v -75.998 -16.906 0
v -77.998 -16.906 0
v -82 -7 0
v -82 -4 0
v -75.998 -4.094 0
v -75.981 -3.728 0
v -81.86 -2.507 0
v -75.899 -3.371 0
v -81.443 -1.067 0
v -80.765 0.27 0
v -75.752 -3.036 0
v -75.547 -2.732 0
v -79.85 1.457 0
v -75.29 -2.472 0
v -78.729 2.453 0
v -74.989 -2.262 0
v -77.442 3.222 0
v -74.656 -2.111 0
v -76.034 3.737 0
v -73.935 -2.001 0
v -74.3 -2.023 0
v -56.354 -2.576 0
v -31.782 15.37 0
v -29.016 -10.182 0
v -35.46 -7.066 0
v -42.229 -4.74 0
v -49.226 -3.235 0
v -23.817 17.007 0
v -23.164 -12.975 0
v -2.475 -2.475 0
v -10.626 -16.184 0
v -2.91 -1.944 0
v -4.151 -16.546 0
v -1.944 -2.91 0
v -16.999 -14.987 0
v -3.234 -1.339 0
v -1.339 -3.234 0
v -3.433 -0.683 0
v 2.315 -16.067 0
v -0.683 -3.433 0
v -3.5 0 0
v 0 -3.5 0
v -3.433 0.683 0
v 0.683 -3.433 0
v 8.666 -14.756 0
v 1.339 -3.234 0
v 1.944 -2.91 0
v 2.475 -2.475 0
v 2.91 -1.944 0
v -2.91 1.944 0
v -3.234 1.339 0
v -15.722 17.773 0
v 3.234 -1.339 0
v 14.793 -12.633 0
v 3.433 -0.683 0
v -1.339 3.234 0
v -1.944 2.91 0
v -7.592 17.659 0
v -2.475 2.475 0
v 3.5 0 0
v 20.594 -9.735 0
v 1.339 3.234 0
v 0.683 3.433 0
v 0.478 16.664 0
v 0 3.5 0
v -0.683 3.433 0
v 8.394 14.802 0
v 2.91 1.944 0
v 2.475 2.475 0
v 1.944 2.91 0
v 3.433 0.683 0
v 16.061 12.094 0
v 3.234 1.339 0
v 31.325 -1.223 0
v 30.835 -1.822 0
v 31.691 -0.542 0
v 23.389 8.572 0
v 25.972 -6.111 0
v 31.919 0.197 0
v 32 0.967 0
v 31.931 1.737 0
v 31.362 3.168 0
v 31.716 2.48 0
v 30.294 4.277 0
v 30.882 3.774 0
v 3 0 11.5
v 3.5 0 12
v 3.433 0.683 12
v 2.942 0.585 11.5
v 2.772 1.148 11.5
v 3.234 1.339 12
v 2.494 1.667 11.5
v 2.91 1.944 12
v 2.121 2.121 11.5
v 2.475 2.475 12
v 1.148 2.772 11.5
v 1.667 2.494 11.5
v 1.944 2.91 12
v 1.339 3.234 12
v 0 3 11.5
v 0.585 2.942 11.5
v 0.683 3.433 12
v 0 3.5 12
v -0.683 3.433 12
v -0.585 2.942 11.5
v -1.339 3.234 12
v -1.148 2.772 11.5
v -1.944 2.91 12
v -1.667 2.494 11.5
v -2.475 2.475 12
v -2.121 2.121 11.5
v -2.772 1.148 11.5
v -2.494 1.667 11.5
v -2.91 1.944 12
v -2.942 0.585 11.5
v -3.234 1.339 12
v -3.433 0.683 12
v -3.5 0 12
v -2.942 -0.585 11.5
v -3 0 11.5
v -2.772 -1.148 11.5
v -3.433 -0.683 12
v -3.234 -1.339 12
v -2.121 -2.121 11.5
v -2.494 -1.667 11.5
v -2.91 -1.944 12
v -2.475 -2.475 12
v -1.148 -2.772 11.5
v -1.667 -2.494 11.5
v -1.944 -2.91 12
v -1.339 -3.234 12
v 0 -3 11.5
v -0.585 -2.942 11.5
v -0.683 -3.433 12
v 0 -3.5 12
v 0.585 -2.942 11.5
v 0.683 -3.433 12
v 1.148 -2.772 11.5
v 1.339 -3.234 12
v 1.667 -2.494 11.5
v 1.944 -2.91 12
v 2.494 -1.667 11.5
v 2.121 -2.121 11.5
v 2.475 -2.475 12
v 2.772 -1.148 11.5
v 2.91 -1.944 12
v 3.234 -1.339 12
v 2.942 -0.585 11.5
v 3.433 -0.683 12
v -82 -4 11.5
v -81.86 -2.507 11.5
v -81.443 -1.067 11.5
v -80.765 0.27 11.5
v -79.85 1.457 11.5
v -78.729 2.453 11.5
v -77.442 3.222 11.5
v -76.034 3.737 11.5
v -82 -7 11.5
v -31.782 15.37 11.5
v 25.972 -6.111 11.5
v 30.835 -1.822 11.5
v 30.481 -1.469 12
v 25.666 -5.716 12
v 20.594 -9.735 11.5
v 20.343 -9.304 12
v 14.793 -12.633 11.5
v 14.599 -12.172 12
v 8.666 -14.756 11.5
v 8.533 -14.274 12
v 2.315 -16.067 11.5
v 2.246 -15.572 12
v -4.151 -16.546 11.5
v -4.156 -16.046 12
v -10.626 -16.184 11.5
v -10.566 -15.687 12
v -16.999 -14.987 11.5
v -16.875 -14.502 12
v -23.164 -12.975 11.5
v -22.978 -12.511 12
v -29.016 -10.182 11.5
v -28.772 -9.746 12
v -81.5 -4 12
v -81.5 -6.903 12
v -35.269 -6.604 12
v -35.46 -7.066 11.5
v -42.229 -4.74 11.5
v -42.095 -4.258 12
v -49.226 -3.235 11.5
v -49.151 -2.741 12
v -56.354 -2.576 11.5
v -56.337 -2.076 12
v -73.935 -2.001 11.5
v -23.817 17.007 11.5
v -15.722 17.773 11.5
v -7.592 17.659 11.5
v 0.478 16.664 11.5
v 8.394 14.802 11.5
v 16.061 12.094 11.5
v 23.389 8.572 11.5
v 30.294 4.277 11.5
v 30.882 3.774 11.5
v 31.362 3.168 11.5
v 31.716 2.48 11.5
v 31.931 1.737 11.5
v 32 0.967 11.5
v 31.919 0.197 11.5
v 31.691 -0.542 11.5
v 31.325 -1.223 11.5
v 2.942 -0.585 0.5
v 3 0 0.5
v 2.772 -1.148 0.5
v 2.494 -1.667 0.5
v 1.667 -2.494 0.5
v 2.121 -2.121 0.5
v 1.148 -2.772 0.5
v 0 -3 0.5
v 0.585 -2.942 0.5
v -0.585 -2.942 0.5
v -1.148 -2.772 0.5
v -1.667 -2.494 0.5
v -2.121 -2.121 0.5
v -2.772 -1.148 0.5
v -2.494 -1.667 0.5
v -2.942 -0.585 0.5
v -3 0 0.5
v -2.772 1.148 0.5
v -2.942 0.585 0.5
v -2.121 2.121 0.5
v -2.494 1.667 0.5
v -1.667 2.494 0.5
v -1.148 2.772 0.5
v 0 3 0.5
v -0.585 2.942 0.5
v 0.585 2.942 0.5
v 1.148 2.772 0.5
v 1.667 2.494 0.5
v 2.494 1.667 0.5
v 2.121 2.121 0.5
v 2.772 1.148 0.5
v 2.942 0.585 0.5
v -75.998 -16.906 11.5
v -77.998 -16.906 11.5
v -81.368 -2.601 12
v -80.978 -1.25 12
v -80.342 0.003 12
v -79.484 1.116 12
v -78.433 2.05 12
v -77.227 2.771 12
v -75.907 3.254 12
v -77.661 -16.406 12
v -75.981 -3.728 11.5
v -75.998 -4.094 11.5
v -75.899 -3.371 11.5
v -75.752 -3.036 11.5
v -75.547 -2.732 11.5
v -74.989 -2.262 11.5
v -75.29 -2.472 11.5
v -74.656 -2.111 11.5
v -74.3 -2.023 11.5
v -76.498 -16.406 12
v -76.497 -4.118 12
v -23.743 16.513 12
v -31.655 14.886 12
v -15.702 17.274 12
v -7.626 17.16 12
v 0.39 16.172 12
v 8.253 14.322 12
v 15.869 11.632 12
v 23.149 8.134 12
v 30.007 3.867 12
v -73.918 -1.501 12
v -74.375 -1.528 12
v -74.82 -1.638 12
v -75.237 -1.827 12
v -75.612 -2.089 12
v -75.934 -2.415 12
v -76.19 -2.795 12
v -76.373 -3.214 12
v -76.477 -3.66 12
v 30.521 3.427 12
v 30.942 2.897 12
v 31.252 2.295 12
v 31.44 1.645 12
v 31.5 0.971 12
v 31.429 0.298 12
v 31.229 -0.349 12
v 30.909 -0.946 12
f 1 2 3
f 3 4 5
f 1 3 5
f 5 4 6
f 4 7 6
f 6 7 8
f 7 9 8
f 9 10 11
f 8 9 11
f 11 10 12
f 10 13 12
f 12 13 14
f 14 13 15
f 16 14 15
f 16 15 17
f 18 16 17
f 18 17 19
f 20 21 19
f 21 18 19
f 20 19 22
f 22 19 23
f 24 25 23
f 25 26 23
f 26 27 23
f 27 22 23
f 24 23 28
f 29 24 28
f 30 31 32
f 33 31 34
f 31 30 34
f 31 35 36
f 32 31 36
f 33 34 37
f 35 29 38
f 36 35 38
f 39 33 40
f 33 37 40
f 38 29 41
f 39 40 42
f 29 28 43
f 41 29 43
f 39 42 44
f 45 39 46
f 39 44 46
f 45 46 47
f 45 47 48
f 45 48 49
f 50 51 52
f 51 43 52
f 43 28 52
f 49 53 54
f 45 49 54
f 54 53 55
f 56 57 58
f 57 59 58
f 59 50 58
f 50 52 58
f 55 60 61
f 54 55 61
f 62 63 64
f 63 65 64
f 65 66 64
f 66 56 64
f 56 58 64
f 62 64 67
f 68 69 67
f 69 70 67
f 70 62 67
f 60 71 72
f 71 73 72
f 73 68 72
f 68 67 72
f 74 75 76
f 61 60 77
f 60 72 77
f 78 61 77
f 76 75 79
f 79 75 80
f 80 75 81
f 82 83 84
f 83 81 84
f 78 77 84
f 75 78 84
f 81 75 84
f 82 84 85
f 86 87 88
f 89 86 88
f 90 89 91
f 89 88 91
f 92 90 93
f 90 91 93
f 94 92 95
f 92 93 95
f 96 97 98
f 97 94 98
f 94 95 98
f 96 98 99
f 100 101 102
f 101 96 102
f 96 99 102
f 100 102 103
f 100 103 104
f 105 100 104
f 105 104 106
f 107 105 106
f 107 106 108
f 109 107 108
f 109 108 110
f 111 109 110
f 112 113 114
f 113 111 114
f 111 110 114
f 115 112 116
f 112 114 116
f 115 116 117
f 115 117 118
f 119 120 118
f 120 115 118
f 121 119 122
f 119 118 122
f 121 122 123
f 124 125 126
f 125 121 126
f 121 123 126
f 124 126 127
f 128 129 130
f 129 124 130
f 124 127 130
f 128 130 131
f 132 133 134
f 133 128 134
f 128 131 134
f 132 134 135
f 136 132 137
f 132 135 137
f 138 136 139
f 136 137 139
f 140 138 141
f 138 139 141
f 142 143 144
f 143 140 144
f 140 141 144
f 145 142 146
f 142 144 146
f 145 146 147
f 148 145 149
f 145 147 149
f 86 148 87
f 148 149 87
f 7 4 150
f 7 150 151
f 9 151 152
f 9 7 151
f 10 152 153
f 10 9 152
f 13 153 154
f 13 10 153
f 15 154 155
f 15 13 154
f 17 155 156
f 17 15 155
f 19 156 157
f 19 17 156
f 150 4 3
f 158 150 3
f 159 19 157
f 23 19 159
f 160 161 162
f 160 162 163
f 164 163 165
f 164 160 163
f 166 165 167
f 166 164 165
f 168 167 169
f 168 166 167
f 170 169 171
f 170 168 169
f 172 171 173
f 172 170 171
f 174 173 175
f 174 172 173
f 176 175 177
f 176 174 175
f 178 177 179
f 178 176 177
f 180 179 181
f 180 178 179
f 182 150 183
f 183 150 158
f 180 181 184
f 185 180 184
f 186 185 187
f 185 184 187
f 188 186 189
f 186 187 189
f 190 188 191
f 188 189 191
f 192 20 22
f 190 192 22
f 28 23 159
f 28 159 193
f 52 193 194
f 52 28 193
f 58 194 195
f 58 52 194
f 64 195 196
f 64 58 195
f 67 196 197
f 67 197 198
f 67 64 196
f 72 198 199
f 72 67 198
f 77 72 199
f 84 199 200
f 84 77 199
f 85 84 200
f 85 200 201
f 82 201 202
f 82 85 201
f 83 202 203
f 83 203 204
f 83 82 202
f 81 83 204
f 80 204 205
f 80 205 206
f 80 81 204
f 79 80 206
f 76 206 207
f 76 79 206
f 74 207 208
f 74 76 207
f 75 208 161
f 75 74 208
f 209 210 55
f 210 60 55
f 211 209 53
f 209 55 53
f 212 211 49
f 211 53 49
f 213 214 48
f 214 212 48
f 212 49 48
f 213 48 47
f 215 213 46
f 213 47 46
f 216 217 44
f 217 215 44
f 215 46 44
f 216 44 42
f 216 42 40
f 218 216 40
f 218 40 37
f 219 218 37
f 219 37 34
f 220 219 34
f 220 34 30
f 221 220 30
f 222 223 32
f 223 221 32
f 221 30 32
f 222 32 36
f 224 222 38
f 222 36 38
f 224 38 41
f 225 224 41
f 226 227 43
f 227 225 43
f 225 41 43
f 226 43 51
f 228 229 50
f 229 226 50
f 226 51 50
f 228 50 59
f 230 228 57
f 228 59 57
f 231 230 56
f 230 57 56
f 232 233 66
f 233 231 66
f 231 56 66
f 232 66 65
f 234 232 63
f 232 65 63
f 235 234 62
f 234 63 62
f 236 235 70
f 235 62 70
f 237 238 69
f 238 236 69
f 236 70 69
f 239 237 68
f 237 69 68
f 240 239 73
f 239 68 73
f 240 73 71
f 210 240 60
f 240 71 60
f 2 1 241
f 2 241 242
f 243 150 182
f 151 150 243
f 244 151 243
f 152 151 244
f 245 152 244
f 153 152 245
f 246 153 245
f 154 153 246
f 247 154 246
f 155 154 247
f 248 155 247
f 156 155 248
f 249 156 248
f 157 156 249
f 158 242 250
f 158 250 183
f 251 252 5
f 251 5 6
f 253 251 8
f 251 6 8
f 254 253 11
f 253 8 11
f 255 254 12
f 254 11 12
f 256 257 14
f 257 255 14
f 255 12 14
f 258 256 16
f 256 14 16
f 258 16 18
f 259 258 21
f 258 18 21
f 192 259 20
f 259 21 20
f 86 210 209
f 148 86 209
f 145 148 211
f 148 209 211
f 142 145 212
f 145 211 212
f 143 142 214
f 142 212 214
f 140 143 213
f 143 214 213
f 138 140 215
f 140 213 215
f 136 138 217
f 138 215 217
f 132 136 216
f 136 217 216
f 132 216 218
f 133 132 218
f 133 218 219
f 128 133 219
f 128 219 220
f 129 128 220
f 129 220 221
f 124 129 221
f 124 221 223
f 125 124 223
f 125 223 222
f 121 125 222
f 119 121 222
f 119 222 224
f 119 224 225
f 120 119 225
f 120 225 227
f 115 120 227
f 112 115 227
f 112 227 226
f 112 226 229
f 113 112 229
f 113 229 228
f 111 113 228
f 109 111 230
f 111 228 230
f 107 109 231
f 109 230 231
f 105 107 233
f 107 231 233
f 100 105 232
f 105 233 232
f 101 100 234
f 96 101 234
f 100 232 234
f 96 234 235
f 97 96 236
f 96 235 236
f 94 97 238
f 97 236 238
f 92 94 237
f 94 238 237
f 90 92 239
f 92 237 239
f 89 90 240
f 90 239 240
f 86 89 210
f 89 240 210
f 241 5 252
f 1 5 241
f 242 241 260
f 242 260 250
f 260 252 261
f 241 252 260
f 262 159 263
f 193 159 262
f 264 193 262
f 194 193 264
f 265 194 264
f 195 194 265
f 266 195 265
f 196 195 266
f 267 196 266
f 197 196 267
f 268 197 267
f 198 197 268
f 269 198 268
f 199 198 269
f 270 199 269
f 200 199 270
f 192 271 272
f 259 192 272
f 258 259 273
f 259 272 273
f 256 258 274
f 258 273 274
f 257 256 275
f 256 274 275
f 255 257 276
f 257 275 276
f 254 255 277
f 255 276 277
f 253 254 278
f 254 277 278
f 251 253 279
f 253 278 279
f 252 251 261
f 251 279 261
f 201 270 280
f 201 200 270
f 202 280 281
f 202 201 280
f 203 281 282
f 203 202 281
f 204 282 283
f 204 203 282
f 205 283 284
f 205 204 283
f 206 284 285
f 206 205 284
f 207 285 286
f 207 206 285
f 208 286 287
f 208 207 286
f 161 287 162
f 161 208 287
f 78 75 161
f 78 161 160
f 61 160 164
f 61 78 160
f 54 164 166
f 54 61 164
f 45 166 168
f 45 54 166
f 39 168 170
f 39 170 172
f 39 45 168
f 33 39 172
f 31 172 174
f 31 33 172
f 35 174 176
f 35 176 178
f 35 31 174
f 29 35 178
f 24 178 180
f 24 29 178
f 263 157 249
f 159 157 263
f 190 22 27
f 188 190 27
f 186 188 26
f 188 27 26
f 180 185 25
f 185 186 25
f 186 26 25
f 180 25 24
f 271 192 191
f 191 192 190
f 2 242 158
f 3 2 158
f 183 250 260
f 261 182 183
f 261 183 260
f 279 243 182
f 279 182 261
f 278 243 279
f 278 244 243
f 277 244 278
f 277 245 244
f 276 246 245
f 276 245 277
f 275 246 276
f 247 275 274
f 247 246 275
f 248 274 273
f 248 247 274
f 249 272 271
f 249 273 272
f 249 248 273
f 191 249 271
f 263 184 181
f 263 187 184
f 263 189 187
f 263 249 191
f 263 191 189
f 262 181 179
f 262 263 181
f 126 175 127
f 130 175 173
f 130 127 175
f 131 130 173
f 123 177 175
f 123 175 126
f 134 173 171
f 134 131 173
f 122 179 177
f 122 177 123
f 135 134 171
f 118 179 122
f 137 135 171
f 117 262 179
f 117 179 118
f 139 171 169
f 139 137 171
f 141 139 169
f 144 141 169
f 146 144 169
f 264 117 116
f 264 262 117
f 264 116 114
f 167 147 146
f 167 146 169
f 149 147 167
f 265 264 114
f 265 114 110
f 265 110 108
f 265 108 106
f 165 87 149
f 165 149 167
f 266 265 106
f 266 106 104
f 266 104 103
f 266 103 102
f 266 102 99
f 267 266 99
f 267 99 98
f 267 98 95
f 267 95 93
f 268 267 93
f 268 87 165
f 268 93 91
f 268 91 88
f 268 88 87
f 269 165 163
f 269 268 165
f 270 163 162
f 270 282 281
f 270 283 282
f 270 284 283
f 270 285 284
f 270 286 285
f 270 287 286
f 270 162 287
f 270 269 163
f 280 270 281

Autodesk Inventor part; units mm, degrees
ref_plane "YZ Plane" through (0, 0, 0) normal (1, 0, 0) x (0, 1, 0)
ref_plane "XZ Plane" through (0, 0, 0) normal (0, 1, 0) x (-1, 0, 0)
ref_plane "XY Plane" through (0, 0, 0) normal (0, 0, 1) x (1, 0, 0)
sketch "Náčrt1" plane through (0, 0, 0) normal (0, 0, 1) x (1, 0, 0)
  line L0 (-106.433, 0) -> (55.3696, 0) projected
  line L1 (0, -81.7425) -> (0, 52.651) projected
  circle A0 centre (0, 0) radius 3
  arc A1 (30.8349, -1.8219) -> (30.2938, 4.277) centre (28, 1) ccw
  arc A2 (-76.0338, 3.7372) -> (-82, -4) centre (-74, -4) ccw
  arc A3 (-73.9347, -2.0011) -> (-75.9978, -4.0942) centre (-74, -4) ccw
  line L2 (-75.9978, -3.9058) -> (-75.9978, -16.9058)
  line L3 (-75.9978, -16.9058) -> (-77.9978, -16.9058)
  line L4 (-77.9978, -16.9058) -> (-82, -7)
  line L5 (-82, -4) -> (-82, -7)
  arc A4 (30.2938, 4.277) -> (-31.7818, 15.3695) centre (-12.7146, -57.1663) ccw
  arc A5 (-29.0159, -10.1823) -> (30.8349, -1.8219) centre (-4.6017, 33.4519) ccw
  arc A6 (-29.0159, -10.1823) -> (-56.3536, -2.5755) centre (-58.3128, -62.5435) ccw
  line L6 (-76.0338, 3.7372) -> (-31.7818, 15.3695)
  line L7 (-73.9347, -2.0011) -> (-56.3536, -2.5755)
  dimension "d0" = 6
  dimension "d1" = 8
  dimension "d2" = 28
  dimension "d3" = 1
  dimension "d4" = 16
  dimension "d5" = 4
  dimension "d6" = 4
  dimension "d7" = 74
  dimension "d8" = 13
  dimension "d9" = 158
  dimension "d10" = 2
  dimension "d11" = 3
  dimension "d12" = 75
  dimension "d13" = 50
  dimension "d14" = 60
extrude "Vysunutí1" add sketch "Náčrt1" along normal blind 12 contours A2 L6 A4 L1 A0 L0 | L0 A0 L1 A5 A6 L7 A3 L2 L3 L4 L5 A2 | L1 A4 A1 L0 A0 | A0 L0 A1 A5 L1
chamfer "Zkosení1" distance 0.5 angle 45 15 edges at (-79.9989, -11.9529, 12) (-76.9978, -16.9058, 12) (-75.9978, -10.5, 12) (-76, -4, 12) (-75.3567, -2.5305, 12) (-65.1442, -2.2883, 12) (-42.2286, -4.7395, 12) (2.3155, -16.0673, 12) (31.9843, 1.3535, 12) (0.4784, 16.6642, 12) (-53.9078, 9.5533, 12) (-80.3352, 0.8851, 12) (-82, -5.5, 12) (-3, 0, 12) (-3, 0, 0)
properties part number "Součást22"
